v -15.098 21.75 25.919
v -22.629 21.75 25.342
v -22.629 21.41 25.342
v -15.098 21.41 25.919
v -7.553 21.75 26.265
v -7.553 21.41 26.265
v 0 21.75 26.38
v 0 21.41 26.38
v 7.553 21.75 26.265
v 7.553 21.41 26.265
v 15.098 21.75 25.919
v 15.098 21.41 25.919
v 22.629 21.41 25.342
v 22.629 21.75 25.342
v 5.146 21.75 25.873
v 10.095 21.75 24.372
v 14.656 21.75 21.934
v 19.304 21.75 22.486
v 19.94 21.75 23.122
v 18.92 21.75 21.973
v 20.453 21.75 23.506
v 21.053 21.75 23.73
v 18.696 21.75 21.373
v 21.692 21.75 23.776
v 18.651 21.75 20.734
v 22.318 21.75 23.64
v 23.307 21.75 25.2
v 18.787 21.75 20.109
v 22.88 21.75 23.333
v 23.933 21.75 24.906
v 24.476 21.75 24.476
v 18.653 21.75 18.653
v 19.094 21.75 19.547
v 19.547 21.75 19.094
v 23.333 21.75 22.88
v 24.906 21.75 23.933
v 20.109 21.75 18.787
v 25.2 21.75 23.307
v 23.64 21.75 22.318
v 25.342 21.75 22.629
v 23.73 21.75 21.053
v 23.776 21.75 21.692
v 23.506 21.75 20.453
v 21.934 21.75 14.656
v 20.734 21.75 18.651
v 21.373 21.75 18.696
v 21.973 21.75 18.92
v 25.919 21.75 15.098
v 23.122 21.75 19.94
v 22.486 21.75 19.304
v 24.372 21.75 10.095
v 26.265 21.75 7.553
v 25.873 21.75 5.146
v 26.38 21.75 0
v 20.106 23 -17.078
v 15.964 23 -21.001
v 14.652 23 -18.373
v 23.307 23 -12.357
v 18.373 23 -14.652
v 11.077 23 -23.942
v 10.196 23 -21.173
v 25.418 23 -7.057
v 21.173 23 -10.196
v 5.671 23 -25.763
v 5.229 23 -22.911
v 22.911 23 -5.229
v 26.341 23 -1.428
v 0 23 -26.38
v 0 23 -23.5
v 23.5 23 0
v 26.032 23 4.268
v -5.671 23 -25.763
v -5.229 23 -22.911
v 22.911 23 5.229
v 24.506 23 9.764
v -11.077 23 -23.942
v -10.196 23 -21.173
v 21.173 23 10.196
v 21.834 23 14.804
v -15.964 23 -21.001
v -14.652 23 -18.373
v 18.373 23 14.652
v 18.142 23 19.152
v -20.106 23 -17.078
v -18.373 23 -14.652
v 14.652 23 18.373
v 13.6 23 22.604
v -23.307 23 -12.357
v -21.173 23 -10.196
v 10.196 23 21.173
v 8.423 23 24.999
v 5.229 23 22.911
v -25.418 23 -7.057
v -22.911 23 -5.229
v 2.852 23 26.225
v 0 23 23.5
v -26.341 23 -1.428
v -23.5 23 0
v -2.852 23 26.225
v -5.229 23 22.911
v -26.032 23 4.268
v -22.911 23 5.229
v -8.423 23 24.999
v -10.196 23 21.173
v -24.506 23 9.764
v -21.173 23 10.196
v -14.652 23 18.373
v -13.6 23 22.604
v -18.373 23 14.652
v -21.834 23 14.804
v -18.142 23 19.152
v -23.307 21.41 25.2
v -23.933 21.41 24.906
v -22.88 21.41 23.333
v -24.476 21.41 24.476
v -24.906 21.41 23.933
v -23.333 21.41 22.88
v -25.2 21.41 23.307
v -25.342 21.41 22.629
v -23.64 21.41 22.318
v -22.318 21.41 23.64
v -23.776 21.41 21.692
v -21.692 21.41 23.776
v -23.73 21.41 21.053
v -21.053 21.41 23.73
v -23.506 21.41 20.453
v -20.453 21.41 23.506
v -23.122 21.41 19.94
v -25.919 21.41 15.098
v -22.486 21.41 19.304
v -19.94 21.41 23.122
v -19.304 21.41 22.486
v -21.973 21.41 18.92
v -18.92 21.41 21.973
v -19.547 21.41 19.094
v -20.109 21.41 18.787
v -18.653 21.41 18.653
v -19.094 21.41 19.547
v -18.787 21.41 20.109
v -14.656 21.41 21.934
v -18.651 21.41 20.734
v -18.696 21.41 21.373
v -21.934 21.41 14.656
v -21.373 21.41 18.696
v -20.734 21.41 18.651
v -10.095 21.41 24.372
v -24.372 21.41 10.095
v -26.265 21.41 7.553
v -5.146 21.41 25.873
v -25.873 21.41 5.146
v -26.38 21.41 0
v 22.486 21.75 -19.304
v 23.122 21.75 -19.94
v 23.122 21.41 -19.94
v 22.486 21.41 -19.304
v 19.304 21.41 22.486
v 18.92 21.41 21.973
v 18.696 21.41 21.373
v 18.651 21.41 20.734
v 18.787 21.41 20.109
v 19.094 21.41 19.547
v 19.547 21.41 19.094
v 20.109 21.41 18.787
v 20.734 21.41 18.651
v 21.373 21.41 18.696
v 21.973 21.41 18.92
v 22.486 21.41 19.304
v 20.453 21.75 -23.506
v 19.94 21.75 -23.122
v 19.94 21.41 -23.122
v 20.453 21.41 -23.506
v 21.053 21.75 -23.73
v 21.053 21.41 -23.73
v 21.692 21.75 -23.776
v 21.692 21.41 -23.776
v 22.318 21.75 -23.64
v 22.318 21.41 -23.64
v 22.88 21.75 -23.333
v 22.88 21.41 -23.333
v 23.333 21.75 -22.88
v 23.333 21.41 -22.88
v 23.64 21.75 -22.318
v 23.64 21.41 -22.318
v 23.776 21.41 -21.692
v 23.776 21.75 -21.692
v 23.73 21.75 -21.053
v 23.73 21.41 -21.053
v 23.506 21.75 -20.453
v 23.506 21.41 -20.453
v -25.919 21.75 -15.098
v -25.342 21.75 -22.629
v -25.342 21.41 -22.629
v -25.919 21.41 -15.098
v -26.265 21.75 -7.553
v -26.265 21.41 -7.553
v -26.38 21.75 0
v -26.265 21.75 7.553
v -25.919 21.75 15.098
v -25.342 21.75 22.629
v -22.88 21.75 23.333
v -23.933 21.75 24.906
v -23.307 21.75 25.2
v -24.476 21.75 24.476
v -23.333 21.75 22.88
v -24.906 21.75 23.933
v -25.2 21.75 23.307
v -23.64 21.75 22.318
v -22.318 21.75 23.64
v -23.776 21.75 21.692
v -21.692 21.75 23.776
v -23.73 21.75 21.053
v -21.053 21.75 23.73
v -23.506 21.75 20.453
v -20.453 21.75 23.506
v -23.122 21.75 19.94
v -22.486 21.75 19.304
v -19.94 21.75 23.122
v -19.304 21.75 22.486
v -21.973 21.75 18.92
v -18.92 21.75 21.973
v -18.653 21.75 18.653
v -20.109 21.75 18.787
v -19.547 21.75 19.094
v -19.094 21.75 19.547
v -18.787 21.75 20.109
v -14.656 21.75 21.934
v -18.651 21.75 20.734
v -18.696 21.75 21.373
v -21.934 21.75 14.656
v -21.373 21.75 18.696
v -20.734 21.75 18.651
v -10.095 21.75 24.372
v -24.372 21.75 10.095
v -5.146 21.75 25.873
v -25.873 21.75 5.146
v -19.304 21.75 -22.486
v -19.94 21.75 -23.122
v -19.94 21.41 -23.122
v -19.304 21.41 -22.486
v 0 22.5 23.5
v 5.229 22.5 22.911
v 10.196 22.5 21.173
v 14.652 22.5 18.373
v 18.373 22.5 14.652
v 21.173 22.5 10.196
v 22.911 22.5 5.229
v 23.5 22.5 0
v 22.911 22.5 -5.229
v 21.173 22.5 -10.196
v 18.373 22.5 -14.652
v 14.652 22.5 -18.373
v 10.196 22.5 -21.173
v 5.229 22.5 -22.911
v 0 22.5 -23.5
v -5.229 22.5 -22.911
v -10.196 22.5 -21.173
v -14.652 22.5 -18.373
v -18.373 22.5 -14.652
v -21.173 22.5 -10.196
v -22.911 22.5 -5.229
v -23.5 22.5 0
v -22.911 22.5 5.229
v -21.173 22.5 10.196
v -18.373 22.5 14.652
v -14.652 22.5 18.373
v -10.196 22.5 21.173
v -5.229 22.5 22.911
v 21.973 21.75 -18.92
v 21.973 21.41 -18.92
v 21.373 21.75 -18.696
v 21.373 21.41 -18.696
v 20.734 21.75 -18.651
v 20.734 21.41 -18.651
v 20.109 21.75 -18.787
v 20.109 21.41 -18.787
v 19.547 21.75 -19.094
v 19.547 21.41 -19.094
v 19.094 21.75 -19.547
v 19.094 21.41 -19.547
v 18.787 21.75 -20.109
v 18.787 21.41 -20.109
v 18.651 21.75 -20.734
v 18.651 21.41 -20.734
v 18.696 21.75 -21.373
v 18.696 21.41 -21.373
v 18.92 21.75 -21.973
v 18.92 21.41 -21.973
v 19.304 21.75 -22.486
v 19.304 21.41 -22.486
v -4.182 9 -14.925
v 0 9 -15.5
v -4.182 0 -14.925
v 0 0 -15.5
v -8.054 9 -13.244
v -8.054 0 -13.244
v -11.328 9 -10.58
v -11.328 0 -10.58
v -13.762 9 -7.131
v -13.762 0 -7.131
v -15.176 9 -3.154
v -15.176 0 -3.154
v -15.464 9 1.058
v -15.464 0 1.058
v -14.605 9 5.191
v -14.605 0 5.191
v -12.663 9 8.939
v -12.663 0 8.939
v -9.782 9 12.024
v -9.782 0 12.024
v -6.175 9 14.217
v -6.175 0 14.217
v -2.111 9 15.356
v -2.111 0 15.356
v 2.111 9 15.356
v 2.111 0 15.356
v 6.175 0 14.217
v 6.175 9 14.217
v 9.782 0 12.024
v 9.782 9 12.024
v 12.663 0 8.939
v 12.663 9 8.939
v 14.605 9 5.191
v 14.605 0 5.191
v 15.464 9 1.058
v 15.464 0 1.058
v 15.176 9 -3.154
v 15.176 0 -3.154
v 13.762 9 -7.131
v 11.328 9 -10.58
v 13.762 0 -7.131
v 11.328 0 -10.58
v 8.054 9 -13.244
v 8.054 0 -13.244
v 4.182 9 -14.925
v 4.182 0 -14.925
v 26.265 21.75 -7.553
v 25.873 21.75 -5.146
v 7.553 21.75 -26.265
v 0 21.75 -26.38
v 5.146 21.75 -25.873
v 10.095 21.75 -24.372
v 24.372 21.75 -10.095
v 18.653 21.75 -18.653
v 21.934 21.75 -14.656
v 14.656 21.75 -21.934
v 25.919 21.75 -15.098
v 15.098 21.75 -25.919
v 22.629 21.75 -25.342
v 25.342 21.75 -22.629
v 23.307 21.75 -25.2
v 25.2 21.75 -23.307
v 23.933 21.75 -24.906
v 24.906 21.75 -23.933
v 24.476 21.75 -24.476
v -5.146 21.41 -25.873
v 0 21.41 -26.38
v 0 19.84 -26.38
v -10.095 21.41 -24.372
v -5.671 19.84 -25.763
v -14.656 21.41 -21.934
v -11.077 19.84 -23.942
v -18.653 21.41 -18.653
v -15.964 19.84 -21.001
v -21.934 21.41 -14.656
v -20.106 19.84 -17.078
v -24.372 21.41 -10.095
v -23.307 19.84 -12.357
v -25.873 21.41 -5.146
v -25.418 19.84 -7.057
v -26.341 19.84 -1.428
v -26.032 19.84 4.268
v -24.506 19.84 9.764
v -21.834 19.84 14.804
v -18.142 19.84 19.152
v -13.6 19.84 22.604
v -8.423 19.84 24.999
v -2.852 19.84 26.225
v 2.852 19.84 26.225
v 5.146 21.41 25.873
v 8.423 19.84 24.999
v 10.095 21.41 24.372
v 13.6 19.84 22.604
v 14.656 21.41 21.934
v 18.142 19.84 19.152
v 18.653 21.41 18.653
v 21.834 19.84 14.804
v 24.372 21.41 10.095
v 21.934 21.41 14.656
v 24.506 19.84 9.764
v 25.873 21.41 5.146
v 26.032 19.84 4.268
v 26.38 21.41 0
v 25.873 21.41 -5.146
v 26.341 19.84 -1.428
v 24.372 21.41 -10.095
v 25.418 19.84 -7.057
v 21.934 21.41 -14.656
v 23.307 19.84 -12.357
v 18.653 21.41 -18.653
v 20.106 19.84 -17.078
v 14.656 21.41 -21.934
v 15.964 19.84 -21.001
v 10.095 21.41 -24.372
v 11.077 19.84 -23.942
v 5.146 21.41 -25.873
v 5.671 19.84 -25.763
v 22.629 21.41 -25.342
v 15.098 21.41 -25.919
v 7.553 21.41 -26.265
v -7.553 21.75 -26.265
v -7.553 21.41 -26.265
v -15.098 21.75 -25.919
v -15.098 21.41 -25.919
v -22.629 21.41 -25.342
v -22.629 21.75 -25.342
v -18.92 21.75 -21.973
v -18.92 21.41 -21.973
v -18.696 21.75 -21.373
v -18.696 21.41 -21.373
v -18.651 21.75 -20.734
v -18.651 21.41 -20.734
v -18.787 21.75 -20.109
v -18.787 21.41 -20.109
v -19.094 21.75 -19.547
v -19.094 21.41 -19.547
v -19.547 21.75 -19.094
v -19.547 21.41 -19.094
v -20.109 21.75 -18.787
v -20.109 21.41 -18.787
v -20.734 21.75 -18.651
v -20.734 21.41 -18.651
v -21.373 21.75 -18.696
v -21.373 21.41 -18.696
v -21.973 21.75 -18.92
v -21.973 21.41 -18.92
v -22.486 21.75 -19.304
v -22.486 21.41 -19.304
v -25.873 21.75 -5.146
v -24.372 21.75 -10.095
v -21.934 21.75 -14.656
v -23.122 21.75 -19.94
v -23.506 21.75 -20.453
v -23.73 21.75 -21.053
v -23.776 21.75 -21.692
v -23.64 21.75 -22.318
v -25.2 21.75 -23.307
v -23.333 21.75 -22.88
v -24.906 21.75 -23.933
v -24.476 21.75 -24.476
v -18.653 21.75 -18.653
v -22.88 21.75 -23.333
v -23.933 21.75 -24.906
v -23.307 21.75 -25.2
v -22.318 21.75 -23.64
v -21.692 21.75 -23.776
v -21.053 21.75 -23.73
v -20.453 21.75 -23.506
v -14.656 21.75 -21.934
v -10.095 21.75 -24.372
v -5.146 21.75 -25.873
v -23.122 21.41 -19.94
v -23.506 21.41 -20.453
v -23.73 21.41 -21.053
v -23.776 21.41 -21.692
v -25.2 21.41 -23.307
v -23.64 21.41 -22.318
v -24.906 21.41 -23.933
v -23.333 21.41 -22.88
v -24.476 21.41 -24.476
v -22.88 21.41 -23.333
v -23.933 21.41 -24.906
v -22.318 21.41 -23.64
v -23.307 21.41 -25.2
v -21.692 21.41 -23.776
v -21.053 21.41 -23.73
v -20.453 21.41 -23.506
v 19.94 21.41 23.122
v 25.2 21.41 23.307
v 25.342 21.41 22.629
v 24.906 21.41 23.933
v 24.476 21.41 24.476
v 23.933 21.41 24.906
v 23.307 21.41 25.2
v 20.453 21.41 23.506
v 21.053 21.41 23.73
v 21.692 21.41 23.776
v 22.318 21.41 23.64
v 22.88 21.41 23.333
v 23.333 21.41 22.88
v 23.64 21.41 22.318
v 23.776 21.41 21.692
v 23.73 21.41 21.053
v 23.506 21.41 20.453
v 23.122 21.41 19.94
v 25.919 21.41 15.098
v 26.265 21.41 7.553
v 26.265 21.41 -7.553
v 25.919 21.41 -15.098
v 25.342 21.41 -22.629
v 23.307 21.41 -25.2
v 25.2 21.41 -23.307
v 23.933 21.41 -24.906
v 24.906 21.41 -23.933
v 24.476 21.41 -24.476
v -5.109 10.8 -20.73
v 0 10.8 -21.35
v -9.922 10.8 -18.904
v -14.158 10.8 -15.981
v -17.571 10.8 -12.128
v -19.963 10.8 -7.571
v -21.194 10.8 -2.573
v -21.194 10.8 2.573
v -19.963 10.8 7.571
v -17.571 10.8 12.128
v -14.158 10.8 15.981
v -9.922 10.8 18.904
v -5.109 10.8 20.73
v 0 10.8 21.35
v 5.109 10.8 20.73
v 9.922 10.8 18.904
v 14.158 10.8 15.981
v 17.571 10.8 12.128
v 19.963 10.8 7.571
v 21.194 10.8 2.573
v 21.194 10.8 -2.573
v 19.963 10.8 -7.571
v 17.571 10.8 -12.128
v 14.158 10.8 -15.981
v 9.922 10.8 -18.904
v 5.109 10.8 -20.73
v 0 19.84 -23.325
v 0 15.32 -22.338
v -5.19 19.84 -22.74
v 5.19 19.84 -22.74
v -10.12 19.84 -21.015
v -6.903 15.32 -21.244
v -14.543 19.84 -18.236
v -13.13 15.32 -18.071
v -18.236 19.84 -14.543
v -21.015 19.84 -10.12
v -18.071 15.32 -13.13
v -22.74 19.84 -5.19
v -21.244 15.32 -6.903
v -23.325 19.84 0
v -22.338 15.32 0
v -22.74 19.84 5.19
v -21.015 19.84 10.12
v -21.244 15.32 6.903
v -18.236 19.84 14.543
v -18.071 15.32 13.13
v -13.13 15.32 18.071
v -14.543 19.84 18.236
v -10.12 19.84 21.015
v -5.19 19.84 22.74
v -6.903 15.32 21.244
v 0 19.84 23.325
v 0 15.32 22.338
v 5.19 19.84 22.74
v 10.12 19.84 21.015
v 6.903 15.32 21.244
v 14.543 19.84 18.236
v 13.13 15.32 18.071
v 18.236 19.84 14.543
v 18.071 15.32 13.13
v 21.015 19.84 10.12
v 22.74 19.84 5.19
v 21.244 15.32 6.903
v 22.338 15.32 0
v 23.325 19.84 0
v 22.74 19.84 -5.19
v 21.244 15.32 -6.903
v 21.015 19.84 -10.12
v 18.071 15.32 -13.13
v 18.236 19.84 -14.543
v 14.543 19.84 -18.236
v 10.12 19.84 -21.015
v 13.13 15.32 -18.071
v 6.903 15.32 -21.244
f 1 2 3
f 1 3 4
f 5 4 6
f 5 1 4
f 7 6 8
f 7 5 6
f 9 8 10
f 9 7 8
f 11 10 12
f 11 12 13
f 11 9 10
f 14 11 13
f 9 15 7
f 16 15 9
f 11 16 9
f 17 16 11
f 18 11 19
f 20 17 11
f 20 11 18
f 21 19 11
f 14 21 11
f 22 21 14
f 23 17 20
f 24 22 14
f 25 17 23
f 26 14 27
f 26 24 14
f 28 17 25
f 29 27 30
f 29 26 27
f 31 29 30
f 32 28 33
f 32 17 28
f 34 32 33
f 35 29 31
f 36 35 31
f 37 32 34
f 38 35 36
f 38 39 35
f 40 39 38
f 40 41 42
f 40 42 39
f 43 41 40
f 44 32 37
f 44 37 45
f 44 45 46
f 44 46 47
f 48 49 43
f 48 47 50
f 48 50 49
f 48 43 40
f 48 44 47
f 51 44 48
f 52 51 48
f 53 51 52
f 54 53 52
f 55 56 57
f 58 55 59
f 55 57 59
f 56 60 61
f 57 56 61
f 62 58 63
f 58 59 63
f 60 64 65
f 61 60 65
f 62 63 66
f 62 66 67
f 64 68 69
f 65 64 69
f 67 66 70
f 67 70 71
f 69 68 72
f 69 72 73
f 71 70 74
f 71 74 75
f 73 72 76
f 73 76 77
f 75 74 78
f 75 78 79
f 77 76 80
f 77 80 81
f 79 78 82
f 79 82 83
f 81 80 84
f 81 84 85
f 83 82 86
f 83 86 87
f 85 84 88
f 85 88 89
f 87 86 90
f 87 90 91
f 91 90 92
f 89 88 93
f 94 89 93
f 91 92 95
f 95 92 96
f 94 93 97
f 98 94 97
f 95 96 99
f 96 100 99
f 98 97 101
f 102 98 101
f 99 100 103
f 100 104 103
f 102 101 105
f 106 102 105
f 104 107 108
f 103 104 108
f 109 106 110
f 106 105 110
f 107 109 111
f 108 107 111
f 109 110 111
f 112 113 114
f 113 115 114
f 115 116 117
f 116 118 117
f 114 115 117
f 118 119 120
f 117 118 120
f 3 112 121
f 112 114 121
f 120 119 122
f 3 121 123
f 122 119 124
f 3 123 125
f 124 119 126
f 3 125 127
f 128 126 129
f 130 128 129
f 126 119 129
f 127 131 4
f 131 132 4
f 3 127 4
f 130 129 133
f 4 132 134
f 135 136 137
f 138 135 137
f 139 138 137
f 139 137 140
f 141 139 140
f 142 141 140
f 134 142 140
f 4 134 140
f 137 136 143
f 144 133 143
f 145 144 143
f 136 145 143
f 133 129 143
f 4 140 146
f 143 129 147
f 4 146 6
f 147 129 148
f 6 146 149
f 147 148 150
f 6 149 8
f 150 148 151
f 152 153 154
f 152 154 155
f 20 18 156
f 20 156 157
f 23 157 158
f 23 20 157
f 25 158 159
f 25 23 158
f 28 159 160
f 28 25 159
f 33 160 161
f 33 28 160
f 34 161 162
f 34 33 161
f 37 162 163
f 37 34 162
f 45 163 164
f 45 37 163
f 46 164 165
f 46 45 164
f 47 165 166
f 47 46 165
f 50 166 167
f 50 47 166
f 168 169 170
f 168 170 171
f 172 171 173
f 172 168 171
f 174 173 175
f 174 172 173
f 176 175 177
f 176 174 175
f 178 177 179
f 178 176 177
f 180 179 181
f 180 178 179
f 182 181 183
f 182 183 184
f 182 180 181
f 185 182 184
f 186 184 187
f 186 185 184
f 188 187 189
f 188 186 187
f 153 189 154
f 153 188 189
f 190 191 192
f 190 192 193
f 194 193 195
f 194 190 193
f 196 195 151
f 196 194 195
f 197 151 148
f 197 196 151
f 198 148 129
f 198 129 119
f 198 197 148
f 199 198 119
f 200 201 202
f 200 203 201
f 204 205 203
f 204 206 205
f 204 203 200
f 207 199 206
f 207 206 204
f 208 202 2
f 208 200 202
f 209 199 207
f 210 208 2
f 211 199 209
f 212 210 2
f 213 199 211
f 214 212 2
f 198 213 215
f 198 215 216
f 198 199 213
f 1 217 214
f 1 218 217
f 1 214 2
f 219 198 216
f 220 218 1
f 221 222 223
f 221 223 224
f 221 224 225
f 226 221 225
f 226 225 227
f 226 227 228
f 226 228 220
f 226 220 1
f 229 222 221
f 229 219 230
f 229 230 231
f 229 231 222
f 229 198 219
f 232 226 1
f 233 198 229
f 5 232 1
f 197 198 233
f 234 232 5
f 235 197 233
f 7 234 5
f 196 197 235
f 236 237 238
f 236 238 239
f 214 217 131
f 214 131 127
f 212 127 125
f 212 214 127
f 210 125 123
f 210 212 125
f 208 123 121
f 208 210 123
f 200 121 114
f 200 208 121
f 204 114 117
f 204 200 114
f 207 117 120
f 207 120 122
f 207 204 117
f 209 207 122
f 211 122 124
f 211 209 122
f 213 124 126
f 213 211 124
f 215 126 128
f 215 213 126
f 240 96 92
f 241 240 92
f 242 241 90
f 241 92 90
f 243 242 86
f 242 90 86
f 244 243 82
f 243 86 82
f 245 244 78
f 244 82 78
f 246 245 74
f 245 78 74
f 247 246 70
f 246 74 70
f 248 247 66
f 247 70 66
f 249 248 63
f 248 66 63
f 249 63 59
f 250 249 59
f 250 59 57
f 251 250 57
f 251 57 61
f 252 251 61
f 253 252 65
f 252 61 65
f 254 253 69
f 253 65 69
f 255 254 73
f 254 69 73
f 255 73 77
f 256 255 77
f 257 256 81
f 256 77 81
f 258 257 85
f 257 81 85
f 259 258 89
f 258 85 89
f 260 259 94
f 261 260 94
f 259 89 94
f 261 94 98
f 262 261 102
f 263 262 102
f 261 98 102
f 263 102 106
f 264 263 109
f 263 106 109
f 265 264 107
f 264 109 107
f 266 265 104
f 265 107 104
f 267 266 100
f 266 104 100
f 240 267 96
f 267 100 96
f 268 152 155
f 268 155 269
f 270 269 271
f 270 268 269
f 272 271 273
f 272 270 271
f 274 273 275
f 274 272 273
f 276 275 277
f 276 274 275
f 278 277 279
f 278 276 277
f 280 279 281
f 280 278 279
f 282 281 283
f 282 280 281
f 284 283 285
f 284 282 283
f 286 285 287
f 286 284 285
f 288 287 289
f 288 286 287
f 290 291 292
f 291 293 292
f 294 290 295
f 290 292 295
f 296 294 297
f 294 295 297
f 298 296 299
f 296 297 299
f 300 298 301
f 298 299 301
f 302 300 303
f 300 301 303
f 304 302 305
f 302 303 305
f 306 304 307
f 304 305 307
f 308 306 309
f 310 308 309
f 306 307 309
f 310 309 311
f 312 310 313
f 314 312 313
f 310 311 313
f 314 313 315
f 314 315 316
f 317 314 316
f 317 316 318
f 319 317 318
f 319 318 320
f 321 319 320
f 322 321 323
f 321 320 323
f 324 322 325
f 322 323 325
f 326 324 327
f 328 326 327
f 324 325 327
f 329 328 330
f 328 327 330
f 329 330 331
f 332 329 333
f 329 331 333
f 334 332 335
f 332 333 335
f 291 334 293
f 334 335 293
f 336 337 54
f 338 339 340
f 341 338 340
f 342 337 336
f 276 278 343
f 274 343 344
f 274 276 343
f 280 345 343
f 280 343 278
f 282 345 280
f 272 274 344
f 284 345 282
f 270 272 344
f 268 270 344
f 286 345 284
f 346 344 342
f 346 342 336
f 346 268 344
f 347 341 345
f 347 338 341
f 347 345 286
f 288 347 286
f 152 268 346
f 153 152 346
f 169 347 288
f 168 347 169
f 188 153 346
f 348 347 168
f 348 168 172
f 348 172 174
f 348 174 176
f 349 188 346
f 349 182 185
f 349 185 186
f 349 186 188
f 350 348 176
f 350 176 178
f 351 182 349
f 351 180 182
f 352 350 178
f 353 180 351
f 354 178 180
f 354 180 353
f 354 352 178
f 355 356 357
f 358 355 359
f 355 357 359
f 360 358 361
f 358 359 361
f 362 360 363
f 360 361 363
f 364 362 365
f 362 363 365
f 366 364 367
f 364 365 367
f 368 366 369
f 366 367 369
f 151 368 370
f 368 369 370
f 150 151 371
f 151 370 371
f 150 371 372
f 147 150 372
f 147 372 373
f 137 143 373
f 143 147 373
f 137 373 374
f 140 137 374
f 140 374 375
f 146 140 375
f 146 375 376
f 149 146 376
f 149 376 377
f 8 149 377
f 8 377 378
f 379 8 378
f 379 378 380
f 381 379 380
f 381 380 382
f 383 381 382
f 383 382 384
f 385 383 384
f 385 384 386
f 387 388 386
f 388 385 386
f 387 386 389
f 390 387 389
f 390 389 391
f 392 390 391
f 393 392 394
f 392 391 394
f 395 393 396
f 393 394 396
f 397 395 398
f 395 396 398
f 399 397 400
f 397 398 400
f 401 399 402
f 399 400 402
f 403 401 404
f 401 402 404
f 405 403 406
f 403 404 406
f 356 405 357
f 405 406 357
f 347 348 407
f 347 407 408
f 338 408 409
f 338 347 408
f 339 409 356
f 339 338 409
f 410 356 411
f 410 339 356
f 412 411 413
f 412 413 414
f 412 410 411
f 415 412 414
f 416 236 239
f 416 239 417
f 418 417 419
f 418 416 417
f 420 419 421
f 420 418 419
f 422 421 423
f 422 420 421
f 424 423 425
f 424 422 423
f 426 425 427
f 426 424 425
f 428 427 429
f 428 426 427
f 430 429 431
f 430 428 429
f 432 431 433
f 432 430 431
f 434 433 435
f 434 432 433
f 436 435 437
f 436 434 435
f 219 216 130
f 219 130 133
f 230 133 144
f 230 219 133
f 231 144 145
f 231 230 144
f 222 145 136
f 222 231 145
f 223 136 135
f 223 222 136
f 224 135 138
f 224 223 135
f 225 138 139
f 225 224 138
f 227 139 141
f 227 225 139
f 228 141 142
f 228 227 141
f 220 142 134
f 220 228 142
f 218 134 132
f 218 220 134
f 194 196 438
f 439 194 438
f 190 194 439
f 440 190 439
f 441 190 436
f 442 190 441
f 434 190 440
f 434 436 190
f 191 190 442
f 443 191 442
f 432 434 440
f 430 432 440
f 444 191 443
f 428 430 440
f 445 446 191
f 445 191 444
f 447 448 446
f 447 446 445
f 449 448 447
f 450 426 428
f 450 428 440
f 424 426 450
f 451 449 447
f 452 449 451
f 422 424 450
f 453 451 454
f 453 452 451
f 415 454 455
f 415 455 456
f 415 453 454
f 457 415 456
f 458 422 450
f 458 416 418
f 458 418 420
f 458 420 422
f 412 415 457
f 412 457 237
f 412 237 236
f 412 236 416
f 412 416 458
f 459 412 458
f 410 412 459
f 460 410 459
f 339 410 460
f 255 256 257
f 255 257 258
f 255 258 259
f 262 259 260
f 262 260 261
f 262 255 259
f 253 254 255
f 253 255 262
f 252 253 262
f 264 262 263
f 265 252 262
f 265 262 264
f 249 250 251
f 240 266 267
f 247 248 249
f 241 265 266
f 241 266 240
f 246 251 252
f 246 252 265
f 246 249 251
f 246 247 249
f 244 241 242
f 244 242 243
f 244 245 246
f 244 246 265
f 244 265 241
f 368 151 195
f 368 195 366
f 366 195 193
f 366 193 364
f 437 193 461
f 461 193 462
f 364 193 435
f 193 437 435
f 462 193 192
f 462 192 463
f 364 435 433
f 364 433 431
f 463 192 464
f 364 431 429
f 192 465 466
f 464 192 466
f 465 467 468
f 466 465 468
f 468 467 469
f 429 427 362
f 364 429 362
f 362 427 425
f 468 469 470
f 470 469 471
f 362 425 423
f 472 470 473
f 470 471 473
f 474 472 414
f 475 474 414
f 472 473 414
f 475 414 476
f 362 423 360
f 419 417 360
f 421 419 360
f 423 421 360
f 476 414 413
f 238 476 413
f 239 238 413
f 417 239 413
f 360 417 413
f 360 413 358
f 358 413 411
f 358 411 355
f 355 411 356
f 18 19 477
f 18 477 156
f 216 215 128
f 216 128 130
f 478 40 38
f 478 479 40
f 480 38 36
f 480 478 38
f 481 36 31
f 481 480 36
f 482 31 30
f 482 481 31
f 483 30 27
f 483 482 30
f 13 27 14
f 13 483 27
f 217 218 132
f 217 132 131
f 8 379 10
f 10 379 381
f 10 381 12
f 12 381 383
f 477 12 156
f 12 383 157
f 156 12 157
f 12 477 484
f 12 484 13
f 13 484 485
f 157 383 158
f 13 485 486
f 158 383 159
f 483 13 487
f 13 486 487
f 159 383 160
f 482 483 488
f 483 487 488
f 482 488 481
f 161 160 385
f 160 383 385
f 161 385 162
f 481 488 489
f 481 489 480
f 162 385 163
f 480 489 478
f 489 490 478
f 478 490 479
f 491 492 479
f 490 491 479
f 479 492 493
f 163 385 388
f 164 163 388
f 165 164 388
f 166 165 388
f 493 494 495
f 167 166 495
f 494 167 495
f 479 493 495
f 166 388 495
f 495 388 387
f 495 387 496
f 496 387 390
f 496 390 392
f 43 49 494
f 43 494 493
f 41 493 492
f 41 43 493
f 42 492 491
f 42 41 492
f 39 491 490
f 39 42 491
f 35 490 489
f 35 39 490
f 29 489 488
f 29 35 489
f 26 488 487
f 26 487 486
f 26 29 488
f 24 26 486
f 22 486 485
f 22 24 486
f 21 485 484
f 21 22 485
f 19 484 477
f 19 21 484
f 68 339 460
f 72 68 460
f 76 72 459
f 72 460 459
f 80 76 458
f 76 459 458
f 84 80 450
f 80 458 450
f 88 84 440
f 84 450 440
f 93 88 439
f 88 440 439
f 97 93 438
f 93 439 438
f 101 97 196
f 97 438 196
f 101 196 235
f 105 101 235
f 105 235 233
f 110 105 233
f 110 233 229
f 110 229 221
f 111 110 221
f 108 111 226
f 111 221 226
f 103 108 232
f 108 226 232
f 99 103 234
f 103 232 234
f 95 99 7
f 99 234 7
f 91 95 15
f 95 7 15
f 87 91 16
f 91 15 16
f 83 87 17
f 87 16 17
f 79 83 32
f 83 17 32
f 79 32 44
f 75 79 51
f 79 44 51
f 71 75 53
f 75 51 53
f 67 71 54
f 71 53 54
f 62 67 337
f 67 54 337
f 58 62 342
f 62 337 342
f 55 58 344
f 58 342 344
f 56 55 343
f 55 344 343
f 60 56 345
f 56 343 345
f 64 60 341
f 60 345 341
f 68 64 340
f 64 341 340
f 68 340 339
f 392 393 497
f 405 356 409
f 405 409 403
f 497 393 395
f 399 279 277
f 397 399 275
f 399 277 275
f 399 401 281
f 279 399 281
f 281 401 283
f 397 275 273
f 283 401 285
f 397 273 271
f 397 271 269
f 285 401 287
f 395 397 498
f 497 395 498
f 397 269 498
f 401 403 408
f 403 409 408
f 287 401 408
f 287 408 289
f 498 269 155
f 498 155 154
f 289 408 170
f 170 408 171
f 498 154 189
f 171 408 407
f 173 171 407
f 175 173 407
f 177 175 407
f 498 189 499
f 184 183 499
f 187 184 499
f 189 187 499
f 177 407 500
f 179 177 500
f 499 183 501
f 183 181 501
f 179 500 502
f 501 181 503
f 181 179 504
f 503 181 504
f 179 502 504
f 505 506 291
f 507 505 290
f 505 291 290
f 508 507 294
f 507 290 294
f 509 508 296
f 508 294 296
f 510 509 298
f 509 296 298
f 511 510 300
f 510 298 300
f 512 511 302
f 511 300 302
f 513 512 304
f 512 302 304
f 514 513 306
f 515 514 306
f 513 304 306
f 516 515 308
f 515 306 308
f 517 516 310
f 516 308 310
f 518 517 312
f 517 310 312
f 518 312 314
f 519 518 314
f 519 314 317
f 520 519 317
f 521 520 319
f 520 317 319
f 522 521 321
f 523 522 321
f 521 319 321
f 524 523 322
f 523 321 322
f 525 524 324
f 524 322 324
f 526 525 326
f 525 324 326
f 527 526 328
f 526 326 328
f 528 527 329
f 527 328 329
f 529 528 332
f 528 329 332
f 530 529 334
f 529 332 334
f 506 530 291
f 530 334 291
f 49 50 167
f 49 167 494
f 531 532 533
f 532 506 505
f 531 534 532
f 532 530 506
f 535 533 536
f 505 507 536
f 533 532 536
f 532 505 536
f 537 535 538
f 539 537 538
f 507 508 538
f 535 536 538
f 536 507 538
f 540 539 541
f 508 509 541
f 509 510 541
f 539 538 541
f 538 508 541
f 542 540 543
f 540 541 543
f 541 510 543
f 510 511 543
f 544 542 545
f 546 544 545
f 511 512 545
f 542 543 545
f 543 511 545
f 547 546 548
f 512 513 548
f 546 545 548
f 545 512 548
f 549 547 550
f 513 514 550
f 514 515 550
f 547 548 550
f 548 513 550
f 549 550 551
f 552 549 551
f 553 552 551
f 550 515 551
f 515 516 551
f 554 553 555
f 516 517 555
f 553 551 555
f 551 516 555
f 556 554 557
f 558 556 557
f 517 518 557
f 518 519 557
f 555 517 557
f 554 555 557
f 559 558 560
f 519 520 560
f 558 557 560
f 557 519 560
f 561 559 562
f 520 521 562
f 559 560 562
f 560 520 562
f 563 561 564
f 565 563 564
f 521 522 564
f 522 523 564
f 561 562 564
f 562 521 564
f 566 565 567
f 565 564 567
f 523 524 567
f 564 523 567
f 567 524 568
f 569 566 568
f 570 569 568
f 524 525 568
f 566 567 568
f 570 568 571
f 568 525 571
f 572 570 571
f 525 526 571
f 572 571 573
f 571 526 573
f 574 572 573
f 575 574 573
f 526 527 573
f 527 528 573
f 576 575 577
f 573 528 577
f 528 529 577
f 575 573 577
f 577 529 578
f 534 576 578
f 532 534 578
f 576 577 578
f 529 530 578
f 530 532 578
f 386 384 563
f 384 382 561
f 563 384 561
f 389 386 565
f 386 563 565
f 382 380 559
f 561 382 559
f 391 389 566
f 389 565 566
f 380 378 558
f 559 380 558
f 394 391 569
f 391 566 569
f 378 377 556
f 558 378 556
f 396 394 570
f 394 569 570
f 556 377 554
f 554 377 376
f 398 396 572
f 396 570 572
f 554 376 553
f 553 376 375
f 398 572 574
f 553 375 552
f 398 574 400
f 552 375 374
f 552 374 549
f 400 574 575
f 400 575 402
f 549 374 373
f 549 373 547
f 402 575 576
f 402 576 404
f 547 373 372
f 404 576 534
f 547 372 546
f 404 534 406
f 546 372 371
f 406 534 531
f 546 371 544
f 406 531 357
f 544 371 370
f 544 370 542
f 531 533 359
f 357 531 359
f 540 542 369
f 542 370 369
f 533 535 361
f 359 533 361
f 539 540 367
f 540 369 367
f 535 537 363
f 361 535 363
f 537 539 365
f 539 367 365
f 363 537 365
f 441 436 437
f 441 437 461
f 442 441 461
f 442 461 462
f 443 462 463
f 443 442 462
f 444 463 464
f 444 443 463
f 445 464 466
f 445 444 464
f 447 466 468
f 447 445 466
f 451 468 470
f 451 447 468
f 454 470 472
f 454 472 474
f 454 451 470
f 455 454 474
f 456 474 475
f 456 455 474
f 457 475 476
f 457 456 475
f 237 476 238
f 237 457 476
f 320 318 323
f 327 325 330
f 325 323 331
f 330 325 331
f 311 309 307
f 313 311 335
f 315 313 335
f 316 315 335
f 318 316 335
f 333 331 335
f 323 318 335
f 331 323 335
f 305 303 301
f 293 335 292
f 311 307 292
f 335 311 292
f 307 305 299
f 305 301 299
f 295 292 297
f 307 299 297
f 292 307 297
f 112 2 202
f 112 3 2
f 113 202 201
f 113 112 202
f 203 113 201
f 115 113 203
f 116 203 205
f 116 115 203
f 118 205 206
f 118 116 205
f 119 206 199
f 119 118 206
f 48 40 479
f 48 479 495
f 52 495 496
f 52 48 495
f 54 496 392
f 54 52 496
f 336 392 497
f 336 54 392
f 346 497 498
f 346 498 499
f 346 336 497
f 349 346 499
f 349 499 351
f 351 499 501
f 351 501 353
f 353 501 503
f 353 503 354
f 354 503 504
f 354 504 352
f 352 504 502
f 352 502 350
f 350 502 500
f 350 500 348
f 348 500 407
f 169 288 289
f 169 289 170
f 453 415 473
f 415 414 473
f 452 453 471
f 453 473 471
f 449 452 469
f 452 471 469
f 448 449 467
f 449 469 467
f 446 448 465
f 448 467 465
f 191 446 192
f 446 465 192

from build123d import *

# Parameters (mm, degrees)
BOSS_EXTRUDE1_DEPTH = 0.34
FILLET1_R           = 3
SKETCH3_R           = 23.5
CUT_EXTRUDE1_DEPTH  = 0.5


with BuildPart() as part:
    # Sketch1 → Revolve1 (revolve)
    with BuildSketch(Plane.XY, mode=Mode.PRIVATE) as revolve1_sk:
        Polygon((0, 0), (0, 23), (26.38, 23), (26.38, 19.84), (23.325, 19.84), (21.35, 10.8), (15.5, 9), (15.5, 0), align=None)
    revolve(revolve1_sk.sketch.rotate(Axis((0, 0, 0), (0, 1, 0)), 90), axis=Axis((0, 0, 0), (0, 1, 0)))

    # Sketch2 → Boss-Extrude1 (add)
    with BuildSketch(Plane(origin=(0, 21.75, 0), x_dir=(1, 0, 0), z_dir=(0, 1, 0))):
        with BuildLine():
            ThreePointArc((25.102290732, -25.102290732), (26.38, 0), (25.102290732, 25.102290732))
            ThreePointArc((25.102290732, 25.102290732), (0, 26.38), (-25.102290732, 25.102290732))
            ThreePointArc((-25.102290732, 25.102290732), (-26.38, 0), (-25.102290732, -25.102290732))
            ThreePointArc((-25.102290732, -25.102290732), (0, -26.38), (25.102290732, -25.102290732))
        make_face()
        with BuildLine():
            Line((-19.940411229, 23.122391745), (-19.304015126, 22.485995642))
            ThreePointArc((-19.304015126, 22.485995642), (-19.304015126, 19.304015126), (-22.485995642, 19.304015126))
            Line((-22.485995642, 19.304015126), (-23.122391745, 19.940411229))
            ThreePointArc((-23.122391745, 19.940411229), (-23.122391745, 23.122391745), (-19.940411229, 23.122391745))
        make_face(mode=Mode.SUBTRACT)
        with BuildLine():
            Line((23.122391745, 19.940411229), (22.485995642, 19.304015126))
            ThreePointArc((22.485995642, 19.304015126), (19.304015126, 19.304015126), (19.304015126, 22.485995642))
            Line((19.304015126, 22.485995642), (19.940411229, 23.122391745))
            ThreePointArc((19.940411229, 23.122391745), (23.122391745, 23.122391745), (23.122391745, 19.940411229))
        make_face(mode=Mode.SUBTRACT)
        with BuildLine():
            Line((19.940411229, -23.122391745), (19.304015126, -22.485995642))
            ThreePointArc((19.304015126, -22.485995642), (19.304015126, -19.304015126), (22.485995642, -19.304015126))
            Line((22.485995642, -19.304015126), (23.122391745, -19.940411229))
            ThreePointArc((23.122391745, -19.940411229), (23.122391745, -23.122391745), (19.940411229, -23.122391745))
        make_face(mode=Mode.SUBTRACT)
        with BuildLine():
            Line((-23.122391745, -19.940411229), (-22.485995642, -19.304015126))
            ThreePointArc((-22.485995642, -19.304015126), (-19.304015126, -19.304015126), (-19.304015126, -22.485995642))
            Line((-19.304015126, -22.485995642), (-19.940411229, -23.122391745))
            ThreePointArc((-19.940411229, -23.122391745), (-23.122391745, -23.122391745), (-23.122391745, -19.940411229))
        make_face(mode=Mode.SUBTRACT)
    extrude(amount=-BOSS_EXTRUDE1_DEPTH)

    # Fillet1
    fillet1_edges = [part.edges().sort_by_distance(p)[0] for p in [
        (-25.102290732, 21.58, 25.102290732),
        (-25.102290732, 21.58, -25.102290732),
        (25.102290732, 21.58, -25.102290732),
        (25.102290732, 21.58, 25.102290732),
    ]]
    fillet(fillet1_edges, radius=FILLET1_R)

    # Sketch3 → Cut-Extrude1 (cut)
    with BuildSketch(Plane(origin=(0, 23, 0), x_dir=(1, 0, 0), z_dir=(0, 1, 0))):
        with Locations(Location((0, 0, 0), (0, 0, 270))):
            Circle(SKETCH3_R)
    extrude(amount=-CUT_EXTRUDE1_DEPTH, mode=Mode.SUBTRACT)


solid = part.part
